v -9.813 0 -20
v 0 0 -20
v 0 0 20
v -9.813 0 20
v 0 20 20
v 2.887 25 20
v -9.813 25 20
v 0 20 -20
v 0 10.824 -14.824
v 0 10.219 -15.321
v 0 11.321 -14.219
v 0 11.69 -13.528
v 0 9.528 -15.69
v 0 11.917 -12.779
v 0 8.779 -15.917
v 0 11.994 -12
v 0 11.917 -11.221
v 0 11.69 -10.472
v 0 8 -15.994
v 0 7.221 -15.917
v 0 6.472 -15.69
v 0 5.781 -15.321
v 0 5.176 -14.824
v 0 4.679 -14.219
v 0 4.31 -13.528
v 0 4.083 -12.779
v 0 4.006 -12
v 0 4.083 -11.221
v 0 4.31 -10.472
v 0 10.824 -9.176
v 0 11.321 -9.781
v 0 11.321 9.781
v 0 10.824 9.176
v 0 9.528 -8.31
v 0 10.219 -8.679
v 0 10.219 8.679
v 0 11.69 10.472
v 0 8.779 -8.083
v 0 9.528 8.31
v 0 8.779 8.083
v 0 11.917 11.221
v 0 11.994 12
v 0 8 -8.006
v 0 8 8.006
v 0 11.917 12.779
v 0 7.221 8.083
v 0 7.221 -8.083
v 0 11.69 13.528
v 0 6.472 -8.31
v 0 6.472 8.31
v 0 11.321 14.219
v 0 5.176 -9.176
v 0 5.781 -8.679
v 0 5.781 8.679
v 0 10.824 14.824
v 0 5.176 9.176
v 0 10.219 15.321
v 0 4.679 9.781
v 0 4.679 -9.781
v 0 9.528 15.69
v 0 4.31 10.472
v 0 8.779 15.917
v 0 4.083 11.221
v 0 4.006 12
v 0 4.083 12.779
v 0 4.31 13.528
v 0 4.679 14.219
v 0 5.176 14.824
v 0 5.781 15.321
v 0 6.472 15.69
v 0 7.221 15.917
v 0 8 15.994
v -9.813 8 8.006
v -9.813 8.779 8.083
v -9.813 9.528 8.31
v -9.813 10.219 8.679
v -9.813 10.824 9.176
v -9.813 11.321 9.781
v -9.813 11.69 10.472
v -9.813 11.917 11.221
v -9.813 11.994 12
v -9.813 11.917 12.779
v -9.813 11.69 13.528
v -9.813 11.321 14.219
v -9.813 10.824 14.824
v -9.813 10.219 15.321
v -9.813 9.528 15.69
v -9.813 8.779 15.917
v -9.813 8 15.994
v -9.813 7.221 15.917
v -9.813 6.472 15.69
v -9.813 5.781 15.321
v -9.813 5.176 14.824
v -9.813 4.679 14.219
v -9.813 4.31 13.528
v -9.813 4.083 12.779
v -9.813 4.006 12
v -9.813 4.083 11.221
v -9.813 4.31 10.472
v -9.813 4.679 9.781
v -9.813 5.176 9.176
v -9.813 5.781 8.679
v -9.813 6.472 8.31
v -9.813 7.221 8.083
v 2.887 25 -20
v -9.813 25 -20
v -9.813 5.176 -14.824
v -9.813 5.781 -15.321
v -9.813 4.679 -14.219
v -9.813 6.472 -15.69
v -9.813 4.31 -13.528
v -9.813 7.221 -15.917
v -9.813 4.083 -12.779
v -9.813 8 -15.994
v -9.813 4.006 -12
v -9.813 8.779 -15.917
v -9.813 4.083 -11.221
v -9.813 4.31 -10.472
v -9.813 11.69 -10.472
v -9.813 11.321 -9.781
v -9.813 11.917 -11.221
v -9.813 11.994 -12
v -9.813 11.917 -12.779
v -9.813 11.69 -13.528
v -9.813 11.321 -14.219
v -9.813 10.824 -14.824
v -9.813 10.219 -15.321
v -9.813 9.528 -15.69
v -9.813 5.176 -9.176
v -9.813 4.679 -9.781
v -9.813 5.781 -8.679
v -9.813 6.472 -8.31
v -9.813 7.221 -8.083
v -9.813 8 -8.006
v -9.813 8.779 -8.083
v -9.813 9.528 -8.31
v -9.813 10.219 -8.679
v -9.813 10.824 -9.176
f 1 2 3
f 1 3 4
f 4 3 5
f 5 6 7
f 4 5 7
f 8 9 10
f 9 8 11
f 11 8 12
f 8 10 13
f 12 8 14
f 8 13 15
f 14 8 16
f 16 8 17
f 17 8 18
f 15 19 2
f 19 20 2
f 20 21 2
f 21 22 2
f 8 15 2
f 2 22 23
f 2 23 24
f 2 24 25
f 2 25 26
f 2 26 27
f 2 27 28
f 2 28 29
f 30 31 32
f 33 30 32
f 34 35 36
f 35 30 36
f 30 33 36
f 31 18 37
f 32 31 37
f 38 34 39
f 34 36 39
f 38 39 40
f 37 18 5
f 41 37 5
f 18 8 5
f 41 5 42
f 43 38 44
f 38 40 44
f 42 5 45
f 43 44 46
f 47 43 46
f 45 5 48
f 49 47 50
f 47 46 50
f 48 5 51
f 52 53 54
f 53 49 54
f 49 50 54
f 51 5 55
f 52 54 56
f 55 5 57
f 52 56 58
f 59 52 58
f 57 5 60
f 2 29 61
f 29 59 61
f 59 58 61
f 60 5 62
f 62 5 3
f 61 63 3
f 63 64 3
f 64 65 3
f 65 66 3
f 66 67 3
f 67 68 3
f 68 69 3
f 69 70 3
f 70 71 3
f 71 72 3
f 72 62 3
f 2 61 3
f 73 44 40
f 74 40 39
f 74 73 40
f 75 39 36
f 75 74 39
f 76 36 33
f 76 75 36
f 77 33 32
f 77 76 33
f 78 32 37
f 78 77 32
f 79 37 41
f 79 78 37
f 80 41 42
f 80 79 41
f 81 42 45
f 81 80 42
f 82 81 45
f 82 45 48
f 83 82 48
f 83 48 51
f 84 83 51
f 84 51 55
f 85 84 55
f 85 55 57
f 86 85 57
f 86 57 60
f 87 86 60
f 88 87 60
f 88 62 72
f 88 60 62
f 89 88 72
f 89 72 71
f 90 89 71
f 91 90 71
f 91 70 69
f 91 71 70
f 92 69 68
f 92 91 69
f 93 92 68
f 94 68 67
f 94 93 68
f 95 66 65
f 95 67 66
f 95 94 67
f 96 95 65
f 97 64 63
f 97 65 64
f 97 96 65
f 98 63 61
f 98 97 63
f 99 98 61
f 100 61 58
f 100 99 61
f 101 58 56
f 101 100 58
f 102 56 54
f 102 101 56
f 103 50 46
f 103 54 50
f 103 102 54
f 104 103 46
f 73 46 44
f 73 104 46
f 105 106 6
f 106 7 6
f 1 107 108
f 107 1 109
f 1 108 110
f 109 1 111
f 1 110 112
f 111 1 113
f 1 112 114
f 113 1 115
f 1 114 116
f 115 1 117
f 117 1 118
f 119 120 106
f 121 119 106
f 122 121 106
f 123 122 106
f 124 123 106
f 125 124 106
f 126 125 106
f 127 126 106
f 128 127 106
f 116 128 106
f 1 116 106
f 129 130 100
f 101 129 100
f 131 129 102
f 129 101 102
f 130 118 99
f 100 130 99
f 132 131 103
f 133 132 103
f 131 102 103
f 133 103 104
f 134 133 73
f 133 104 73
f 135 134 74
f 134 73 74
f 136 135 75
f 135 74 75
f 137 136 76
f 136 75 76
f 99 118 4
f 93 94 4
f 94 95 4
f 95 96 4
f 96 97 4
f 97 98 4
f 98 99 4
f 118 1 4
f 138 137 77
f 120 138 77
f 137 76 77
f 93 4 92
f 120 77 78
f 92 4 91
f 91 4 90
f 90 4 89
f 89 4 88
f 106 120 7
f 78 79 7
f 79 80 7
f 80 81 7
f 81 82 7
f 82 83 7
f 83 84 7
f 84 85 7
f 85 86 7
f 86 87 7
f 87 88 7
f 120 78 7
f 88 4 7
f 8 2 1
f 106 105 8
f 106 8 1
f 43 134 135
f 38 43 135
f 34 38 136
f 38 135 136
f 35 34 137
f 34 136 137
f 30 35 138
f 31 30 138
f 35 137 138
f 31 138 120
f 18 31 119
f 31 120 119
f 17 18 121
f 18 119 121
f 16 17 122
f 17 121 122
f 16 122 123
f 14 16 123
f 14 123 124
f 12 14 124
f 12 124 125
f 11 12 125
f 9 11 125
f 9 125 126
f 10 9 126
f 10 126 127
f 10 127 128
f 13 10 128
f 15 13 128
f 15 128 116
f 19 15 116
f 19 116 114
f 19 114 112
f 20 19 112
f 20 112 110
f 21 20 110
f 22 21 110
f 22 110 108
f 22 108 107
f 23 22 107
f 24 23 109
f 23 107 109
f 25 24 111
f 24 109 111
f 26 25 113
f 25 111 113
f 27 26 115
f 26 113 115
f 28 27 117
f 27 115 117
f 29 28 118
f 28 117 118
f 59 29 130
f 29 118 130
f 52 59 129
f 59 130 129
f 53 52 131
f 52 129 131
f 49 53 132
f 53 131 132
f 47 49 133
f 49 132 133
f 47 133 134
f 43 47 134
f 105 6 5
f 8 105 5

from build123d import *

# Parameters (mm, degrees)
BOSS_EXTRUDE1_DEPTH = 20
SKETCH4_R           = 3.99415
CUT_EXTRUDE1_DEPTH  = 13.7


with BuildPart() as part:
    # Sketch2 → Boss-Extrude1 (new body, symmetric)
    with BuildSketch(Plane.XY):
        Polygon((0, 0), (-9.813248654, 0), (-9.813248654, 25), (2.886751346, 25), (0, 20), align=None)
    extrude(amount=BOSS_EXTRUDE1_DEPTH, both=True)

    # Sketch4 → Cut-Extrude1 (cut, through all)
    with BuildSketch(Plane.ZY.offset(9.813248654)):
        with Locations((-12, 8)):
            Circle(SKETCH4_R)
    cut_extrude1 = extrude(amount=-CUT_EXTRUDE1_DEPTH, mode=Mode.SUBTRACT)

    # Mirror1: Cut-Extrude1 across plane
    add(cut_extrude1.mirror(Plane.XY), mode=Mode.SUBTRACT)


solid = part.part
